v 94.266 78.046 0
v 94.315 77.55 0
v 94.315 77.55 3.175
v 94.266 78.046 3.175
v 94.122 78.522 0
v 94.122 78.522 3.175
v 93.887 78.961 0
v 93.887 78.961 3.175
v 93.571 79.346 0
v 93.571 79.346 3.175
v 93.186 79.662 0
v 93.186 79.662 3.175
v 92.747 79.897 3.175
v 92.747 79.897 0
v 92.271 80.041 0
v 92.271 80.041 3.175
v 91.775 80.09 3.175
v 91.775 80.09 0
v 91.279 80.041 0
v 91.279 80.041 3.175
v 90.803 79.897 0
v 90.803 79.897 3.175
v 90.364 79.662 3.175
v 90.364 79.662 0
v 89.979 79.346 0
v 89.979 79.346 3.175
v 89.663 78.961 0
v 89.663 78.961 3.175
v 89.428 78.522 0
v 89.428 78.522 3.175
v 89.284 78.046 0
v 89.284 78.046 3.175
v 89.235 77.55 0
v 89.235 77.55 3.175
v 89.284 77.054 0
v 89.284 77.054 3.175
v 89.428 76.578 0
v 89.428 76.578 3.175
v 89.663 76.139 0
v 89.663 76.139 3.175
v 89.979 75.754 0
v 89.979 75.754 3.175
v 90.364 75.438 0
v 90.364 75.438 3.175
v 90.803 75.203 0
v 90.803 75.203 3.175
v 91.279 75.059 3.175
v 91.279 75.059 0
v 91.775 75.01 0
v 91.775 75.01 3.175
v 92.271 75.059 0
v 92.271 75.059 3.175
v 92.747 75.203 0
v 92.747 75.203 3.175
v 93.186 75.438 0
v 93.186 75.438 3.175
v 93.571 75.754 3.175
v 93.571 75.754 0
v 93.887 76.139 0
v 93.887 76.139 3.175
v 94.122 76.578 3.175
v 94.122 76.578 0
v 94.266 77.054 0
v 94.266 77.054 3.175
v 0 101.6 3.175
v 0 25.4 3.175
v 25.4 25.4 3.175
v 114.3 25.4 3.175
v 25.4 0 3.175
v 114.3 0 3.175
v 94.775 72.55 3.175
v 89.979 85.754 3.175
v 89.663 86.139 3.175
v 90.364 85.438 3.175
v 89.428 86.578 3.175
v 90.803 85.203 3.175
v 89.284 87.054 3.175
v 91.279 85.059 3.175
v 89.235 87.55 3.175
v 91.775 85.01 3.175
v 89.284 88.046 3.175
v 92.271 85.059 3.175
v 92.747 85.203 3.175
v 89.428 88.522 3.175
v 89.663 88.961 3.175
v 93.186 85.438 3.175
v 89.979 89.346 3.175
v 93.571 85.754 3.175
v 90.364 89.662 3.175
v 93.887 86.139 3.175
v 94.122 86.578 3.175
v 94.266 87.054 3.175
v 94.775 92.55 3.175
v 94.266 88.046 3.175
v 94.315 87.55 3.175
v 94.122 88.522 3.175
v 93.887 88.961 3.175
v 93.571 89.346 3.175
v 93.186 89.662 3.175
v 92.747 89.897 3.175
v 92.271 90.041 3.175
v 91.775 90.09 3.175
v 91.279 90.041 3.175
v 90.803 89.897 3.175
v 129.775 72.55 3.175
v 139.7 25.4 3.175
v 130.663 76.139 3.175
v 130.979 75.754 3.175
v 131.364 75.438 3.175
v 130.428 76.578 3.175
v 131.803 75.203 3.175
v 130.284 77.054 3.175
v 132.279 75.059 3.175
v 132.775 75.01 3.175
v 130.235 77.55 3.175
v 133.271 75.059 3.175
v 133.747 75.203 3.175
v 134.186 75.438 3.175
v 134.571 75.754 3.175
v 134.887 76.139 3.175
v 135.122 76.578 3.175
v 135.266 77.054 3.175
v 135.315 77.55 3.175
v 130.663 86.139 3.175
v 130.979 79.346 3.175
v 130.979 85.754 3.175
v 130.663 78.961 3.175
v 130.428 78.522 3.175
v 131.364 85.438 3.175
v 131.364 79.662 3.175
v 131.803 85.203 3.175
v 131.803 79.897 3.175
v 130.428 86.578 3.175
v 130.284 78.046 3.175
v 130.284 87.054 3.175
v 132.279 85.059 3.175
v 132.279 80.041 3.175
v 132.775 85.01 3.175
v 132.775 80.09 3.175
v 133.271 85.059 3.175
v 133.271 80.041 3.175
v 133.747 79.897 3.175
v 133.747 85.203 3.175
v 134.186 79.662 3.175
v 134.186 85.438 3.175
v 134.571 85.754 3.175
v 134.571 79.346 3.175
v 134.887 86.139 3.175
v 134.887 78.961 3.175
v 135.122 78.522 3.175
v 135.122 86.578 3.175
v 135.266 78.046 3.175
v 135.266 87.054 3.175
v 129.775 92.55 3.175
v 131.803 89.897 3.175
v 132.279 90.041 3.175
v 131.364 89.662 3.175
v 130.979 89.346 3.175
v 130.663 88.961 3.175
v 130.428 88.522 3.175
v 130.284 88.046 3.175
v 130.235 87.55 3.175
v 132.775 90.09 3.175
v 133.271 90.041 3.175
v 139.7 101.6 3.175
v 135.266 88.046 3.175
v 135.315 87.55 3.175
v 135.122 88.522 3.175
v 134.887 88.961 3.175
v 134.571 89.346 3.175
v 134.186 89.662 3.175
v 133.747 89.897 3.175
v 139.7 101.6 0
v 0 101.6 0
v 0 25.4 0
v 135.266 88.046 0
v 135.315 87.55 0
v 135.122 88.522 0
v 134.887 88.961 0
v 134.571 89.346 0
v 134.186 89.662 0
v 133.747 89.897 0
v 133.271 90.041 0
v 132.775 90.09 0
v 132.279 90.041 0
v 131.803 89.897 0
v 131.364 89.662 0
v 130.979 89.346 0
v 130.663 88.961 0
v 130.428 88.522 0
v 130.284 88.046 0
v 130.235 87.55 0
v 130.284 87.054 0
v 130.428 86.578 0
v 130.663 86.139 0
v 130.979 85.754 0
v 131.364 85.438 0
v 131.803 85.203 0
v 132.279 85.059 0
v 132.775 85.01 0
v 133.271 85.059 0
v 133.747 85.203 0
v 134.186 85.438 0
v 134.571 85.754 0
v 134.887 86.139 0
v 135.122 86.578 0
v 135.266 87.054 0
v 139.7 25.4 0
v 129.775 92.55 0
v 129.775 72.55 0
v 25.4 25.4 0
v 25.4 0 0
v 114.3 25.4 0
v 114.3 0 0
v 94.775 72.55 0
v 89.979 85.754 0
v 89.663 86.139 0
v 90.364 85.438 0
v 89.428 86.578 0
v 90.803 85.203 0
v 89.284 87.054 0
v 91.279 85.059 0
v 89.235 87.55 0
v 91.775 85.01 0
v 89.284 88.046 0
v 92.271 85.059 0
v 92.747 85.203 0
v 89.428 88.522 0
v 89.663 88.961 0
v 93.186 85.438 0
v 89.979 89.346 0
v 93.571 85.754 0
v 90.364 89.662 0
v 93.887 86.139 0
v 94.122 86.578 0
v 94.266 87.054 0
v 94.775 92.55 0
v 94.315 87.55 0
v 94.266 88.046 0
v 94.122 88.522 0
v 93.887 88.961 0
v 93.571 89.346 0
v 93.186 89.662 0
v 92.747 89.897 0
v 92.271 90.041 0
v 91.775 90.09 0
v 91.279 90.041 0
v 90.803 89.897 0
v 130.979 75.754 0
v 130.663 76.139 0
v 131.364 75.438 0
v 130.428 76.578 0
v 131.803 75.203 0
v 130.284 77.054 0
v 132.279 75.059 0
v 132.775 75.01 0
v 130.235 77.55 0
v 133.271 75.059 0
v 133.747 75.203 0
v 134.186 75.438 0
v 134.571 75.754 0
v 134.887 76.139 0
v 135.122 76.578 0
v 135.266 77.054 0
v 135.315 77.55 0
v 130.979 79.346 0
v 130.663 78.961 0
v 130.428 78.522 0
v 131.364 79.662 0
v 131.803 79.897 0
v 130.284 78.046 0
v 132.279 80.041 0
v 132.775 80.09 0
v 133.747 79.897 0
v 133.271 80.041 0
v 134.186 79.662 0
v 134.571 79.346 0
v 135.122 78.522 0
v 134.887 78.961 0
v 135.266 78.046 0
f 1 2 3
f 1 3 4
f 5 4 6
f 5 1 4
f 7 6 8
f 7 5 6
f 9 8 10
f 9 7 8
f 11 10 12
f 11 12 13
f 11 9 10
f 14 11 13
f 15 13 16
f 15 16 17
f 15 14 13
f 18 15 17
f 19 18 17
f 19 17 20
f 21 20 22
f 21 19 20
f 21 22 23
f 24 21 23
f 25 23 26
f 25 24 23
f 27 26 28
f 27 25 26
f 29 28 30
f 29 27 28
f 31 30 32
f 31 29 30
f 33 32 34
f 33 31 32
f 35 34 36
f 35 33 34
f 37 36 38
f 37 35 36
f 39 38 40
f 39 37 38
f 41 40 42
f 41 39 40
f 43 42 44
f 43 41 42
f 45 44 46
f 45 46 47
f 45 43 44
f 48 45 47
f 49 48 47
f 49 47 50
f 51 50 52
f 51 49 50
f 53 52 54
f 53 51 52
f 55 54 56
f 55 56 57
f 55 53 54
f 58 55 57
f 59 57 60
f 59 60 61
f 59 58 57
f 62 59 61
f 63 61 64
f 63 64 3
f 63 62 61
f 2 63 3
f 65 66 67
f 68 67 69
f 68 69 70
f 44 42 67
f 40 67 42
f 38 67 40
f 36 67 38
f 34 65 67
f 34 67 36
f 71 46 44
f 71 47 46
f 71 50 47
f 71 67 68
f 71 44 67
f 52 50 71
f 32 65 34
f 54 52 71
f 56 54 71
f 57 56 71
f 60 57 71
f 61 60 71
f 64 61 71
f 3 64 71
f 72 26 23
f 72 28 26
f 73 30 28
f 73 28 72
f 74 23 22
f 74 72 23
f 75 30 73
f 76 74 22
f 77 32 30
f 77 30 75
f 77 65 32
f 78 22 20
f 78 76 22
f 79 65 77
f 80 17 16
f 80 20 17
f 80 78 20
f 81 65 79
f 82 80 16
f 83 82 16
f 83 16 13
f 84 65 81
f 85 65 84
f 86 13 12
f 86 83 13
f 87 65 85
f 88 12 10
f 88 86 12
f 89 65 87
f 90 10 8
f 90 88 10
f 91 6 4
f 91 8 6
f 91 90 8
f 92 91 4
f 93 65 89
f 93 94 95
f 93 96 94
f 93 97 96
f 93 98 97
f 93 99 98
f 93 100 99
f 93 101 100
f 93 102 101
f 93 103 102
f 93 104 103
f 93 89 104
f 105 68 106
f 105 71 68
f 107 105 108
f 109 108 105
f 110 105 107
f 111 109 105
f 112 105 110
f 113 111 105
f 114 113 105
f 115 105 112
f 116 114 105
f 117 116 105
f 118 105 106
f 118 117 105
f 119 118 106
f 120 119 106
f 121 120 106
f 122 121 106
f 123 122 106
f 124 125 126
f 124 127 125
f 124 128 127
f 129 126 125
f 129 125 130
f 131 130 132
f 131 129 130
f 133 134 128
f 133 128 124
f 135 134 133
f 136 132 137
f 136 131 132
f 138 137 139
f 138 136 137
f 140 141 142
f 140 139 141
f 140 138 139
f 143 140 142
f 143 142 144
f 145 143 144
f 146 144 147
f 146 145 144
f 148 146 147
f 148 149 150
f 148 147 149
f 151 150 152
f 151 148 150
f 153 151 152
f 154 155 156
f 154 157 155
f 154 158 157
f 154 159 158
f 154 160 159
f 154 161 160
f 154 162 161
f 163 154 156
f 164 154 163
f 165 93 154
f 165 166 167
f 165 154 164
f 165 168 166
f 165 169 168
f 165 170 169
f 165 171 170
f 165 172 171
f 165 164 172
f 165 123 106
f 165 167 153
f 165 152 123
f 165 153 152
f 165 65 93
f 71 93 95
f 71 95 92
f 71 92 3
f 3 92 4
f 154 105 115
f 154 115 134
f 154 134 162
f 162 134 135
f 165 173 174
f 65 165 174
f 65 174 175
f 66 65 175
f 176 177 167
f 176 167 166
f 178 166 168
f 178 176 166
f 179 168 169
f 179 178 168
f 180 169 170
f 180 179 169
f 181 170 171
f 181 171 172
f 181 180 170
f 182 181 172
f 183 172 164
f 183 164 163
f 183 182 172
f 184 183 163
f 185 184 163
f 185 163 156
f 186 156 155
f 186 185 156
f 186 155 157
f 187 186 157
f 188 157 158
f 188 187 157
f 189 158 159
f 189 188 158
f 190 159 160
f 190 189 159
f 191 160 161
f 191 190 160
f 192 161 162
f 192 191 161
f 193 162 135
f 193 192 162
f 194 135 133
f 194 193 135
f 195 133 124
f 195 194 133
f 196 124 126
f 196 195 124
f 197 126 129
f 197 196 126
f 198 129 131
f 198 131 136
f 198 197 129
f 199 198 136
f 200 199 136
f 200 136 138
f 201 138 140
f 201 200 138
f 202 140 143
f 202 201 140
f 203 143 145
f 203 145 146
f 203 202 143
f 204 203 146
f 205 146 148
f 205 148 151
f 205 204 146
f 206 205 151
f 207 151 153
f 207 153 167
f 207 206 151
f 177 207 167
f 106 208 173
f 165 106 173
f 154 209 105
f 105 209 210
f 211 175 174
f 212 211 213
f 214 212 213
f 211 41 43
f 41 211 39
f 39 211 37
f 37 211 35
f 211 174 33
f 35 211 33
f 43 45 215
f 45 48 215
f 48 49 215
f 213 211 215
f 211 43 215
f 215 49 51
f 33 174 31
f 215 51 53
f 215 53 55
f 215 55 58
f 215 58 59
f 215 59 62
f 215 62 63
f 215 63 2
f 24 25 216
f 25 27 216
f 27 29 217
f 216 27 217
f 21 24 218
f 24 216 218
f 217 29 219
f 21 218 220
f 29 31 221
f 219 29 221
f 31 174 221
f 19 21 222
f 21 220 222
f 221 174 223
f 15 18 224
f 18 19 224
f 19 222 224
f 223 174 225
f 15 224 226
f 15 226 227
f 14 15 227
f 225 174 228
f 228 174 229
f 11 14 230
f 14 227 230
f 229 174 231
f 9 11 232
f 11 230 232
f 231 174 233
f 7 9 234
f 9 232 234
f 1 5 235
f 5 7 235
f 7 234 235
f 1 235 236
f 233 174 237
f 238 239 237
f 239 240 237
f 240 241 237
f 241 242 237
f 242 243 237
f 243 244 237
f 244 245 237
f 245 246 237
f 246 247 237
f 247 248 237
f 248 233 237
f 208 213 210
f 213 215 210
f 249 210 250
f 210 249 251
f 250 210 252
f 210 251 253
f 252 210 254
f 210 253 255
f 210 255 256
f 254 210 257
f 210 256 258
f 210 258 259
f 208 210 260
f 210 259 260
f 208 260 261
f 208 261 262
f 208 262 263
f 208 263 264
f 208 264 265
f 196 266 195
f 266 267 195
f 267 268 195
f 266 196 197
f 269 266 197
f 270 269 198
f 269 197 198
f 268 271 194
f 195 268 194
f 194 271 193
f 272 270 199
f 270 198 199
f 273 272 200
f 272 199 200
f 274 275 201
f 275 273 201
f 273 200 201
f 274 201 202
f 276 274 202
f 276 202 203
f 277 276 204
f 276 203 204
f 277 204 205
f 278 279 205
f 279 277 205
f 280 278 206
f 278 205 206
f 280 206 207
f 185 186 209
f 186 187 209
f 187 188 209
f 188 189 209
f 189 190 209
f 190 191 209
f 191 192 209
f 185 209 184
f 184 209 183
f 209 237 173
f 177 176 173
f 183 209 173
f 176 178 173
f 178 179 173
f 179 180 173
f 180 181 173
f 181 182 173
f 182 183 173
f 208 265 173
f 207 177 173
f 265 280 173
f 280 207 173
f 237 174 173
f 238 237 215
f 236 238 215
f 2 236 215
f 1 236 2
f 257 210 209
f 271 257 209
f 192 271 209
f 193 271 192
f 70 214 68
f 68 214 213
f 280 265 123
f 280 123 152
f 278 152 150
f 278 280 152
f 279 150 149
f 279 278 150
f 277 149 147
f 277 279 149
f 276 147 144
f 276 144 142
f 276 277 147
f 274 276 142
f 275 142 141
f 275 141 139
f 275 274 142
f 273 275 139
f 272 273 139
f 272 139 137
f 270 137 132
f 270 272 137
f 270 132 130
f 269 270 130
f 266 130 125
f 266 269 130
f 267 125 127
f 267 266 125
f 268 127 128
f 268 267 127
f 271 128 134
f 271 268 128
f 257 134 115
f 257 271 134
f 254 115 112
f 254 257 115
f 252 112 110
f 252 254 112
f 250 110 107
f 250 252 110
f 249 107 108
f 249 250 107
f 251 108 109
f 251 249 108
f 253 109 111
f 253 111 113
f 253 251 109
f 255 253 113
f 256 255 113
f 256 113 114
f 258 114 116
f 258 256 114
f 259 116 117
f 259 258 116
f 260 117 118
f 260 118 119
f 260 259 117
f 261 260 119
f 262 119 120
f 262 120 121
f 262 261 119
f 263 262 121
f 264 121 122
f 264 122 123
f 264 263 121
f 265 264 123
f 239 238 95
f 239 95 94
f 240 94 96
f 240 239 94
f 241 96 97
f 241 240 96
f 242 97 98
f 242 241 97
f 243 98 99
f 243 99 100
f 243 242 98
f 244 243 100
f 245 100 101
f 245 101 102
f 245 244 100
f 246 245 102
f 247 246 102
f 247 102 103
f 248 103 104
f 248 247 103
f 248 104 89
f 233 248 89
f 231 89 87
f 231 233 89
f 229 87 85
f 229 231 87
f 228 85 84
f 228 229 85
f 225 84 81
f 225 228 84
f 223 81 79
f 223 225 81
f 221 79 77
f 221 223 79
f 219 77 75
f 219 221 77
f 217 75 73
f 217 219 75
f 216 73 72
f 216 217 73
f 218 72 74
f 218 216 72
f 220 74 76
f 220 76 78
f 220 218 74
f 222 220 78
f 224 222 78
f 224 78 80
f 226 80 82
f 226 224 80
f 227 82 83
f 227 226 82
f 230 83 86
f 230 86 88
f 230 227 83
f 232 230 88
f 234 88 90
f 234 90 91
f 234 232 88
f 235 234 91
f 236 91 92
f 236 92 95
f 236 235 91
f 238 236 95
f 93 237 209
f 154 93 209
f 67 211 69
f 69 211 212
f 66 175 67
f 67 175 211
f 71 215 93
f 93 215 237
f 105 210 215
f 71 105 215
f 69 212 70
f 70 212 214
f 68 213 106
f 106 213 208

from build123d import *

# Parameters (mm, degrees)
F0_R     = 2.54
F1_DEPTH = 3.175


# Not quite as in the source:
# - a length typed as a fraction of an inch, garbled in the dataset ("3 / 203.2 mm" for 3/8 in), is restored


with BuildPart() as f1:
    # F0 (on Top) → F1 (new body)
    with BuildSketch(Plane.XY):
        Polygon((139.7, 101.6), (0, 101.6), (0, 25.4), (25.4, 25.4), (25.4, 0), (114.3, 0), (114.3, 25.4), (139.7, 25.4), align=None)
        with Locations((91.775, 77.55)):
            Circle(F0_R, mode=Mode.SUBTRACT)
        with Locations((91.775, 87.55)):
            Circle(F0_R, mode=Mode.SUBTRACT)
        Polygon((94.775, 92.55), (104.775, 92.55), (129.775, 92.55), (129.775, 72.55), (104.775, 72.55), (94.775, 72.55), align=None, mode=Mode.SUBTRACT)
        with Locations((132.775, 77.55)):
            Circle(F0_R, mode=Mode.SUBTRACT)
        with Locations((132.775, 87.55)):
            Circle(F0_R, mode=Mode.SUBTRACT)
    extrude(amount=F1_DEPTH)


solid = f1.part
